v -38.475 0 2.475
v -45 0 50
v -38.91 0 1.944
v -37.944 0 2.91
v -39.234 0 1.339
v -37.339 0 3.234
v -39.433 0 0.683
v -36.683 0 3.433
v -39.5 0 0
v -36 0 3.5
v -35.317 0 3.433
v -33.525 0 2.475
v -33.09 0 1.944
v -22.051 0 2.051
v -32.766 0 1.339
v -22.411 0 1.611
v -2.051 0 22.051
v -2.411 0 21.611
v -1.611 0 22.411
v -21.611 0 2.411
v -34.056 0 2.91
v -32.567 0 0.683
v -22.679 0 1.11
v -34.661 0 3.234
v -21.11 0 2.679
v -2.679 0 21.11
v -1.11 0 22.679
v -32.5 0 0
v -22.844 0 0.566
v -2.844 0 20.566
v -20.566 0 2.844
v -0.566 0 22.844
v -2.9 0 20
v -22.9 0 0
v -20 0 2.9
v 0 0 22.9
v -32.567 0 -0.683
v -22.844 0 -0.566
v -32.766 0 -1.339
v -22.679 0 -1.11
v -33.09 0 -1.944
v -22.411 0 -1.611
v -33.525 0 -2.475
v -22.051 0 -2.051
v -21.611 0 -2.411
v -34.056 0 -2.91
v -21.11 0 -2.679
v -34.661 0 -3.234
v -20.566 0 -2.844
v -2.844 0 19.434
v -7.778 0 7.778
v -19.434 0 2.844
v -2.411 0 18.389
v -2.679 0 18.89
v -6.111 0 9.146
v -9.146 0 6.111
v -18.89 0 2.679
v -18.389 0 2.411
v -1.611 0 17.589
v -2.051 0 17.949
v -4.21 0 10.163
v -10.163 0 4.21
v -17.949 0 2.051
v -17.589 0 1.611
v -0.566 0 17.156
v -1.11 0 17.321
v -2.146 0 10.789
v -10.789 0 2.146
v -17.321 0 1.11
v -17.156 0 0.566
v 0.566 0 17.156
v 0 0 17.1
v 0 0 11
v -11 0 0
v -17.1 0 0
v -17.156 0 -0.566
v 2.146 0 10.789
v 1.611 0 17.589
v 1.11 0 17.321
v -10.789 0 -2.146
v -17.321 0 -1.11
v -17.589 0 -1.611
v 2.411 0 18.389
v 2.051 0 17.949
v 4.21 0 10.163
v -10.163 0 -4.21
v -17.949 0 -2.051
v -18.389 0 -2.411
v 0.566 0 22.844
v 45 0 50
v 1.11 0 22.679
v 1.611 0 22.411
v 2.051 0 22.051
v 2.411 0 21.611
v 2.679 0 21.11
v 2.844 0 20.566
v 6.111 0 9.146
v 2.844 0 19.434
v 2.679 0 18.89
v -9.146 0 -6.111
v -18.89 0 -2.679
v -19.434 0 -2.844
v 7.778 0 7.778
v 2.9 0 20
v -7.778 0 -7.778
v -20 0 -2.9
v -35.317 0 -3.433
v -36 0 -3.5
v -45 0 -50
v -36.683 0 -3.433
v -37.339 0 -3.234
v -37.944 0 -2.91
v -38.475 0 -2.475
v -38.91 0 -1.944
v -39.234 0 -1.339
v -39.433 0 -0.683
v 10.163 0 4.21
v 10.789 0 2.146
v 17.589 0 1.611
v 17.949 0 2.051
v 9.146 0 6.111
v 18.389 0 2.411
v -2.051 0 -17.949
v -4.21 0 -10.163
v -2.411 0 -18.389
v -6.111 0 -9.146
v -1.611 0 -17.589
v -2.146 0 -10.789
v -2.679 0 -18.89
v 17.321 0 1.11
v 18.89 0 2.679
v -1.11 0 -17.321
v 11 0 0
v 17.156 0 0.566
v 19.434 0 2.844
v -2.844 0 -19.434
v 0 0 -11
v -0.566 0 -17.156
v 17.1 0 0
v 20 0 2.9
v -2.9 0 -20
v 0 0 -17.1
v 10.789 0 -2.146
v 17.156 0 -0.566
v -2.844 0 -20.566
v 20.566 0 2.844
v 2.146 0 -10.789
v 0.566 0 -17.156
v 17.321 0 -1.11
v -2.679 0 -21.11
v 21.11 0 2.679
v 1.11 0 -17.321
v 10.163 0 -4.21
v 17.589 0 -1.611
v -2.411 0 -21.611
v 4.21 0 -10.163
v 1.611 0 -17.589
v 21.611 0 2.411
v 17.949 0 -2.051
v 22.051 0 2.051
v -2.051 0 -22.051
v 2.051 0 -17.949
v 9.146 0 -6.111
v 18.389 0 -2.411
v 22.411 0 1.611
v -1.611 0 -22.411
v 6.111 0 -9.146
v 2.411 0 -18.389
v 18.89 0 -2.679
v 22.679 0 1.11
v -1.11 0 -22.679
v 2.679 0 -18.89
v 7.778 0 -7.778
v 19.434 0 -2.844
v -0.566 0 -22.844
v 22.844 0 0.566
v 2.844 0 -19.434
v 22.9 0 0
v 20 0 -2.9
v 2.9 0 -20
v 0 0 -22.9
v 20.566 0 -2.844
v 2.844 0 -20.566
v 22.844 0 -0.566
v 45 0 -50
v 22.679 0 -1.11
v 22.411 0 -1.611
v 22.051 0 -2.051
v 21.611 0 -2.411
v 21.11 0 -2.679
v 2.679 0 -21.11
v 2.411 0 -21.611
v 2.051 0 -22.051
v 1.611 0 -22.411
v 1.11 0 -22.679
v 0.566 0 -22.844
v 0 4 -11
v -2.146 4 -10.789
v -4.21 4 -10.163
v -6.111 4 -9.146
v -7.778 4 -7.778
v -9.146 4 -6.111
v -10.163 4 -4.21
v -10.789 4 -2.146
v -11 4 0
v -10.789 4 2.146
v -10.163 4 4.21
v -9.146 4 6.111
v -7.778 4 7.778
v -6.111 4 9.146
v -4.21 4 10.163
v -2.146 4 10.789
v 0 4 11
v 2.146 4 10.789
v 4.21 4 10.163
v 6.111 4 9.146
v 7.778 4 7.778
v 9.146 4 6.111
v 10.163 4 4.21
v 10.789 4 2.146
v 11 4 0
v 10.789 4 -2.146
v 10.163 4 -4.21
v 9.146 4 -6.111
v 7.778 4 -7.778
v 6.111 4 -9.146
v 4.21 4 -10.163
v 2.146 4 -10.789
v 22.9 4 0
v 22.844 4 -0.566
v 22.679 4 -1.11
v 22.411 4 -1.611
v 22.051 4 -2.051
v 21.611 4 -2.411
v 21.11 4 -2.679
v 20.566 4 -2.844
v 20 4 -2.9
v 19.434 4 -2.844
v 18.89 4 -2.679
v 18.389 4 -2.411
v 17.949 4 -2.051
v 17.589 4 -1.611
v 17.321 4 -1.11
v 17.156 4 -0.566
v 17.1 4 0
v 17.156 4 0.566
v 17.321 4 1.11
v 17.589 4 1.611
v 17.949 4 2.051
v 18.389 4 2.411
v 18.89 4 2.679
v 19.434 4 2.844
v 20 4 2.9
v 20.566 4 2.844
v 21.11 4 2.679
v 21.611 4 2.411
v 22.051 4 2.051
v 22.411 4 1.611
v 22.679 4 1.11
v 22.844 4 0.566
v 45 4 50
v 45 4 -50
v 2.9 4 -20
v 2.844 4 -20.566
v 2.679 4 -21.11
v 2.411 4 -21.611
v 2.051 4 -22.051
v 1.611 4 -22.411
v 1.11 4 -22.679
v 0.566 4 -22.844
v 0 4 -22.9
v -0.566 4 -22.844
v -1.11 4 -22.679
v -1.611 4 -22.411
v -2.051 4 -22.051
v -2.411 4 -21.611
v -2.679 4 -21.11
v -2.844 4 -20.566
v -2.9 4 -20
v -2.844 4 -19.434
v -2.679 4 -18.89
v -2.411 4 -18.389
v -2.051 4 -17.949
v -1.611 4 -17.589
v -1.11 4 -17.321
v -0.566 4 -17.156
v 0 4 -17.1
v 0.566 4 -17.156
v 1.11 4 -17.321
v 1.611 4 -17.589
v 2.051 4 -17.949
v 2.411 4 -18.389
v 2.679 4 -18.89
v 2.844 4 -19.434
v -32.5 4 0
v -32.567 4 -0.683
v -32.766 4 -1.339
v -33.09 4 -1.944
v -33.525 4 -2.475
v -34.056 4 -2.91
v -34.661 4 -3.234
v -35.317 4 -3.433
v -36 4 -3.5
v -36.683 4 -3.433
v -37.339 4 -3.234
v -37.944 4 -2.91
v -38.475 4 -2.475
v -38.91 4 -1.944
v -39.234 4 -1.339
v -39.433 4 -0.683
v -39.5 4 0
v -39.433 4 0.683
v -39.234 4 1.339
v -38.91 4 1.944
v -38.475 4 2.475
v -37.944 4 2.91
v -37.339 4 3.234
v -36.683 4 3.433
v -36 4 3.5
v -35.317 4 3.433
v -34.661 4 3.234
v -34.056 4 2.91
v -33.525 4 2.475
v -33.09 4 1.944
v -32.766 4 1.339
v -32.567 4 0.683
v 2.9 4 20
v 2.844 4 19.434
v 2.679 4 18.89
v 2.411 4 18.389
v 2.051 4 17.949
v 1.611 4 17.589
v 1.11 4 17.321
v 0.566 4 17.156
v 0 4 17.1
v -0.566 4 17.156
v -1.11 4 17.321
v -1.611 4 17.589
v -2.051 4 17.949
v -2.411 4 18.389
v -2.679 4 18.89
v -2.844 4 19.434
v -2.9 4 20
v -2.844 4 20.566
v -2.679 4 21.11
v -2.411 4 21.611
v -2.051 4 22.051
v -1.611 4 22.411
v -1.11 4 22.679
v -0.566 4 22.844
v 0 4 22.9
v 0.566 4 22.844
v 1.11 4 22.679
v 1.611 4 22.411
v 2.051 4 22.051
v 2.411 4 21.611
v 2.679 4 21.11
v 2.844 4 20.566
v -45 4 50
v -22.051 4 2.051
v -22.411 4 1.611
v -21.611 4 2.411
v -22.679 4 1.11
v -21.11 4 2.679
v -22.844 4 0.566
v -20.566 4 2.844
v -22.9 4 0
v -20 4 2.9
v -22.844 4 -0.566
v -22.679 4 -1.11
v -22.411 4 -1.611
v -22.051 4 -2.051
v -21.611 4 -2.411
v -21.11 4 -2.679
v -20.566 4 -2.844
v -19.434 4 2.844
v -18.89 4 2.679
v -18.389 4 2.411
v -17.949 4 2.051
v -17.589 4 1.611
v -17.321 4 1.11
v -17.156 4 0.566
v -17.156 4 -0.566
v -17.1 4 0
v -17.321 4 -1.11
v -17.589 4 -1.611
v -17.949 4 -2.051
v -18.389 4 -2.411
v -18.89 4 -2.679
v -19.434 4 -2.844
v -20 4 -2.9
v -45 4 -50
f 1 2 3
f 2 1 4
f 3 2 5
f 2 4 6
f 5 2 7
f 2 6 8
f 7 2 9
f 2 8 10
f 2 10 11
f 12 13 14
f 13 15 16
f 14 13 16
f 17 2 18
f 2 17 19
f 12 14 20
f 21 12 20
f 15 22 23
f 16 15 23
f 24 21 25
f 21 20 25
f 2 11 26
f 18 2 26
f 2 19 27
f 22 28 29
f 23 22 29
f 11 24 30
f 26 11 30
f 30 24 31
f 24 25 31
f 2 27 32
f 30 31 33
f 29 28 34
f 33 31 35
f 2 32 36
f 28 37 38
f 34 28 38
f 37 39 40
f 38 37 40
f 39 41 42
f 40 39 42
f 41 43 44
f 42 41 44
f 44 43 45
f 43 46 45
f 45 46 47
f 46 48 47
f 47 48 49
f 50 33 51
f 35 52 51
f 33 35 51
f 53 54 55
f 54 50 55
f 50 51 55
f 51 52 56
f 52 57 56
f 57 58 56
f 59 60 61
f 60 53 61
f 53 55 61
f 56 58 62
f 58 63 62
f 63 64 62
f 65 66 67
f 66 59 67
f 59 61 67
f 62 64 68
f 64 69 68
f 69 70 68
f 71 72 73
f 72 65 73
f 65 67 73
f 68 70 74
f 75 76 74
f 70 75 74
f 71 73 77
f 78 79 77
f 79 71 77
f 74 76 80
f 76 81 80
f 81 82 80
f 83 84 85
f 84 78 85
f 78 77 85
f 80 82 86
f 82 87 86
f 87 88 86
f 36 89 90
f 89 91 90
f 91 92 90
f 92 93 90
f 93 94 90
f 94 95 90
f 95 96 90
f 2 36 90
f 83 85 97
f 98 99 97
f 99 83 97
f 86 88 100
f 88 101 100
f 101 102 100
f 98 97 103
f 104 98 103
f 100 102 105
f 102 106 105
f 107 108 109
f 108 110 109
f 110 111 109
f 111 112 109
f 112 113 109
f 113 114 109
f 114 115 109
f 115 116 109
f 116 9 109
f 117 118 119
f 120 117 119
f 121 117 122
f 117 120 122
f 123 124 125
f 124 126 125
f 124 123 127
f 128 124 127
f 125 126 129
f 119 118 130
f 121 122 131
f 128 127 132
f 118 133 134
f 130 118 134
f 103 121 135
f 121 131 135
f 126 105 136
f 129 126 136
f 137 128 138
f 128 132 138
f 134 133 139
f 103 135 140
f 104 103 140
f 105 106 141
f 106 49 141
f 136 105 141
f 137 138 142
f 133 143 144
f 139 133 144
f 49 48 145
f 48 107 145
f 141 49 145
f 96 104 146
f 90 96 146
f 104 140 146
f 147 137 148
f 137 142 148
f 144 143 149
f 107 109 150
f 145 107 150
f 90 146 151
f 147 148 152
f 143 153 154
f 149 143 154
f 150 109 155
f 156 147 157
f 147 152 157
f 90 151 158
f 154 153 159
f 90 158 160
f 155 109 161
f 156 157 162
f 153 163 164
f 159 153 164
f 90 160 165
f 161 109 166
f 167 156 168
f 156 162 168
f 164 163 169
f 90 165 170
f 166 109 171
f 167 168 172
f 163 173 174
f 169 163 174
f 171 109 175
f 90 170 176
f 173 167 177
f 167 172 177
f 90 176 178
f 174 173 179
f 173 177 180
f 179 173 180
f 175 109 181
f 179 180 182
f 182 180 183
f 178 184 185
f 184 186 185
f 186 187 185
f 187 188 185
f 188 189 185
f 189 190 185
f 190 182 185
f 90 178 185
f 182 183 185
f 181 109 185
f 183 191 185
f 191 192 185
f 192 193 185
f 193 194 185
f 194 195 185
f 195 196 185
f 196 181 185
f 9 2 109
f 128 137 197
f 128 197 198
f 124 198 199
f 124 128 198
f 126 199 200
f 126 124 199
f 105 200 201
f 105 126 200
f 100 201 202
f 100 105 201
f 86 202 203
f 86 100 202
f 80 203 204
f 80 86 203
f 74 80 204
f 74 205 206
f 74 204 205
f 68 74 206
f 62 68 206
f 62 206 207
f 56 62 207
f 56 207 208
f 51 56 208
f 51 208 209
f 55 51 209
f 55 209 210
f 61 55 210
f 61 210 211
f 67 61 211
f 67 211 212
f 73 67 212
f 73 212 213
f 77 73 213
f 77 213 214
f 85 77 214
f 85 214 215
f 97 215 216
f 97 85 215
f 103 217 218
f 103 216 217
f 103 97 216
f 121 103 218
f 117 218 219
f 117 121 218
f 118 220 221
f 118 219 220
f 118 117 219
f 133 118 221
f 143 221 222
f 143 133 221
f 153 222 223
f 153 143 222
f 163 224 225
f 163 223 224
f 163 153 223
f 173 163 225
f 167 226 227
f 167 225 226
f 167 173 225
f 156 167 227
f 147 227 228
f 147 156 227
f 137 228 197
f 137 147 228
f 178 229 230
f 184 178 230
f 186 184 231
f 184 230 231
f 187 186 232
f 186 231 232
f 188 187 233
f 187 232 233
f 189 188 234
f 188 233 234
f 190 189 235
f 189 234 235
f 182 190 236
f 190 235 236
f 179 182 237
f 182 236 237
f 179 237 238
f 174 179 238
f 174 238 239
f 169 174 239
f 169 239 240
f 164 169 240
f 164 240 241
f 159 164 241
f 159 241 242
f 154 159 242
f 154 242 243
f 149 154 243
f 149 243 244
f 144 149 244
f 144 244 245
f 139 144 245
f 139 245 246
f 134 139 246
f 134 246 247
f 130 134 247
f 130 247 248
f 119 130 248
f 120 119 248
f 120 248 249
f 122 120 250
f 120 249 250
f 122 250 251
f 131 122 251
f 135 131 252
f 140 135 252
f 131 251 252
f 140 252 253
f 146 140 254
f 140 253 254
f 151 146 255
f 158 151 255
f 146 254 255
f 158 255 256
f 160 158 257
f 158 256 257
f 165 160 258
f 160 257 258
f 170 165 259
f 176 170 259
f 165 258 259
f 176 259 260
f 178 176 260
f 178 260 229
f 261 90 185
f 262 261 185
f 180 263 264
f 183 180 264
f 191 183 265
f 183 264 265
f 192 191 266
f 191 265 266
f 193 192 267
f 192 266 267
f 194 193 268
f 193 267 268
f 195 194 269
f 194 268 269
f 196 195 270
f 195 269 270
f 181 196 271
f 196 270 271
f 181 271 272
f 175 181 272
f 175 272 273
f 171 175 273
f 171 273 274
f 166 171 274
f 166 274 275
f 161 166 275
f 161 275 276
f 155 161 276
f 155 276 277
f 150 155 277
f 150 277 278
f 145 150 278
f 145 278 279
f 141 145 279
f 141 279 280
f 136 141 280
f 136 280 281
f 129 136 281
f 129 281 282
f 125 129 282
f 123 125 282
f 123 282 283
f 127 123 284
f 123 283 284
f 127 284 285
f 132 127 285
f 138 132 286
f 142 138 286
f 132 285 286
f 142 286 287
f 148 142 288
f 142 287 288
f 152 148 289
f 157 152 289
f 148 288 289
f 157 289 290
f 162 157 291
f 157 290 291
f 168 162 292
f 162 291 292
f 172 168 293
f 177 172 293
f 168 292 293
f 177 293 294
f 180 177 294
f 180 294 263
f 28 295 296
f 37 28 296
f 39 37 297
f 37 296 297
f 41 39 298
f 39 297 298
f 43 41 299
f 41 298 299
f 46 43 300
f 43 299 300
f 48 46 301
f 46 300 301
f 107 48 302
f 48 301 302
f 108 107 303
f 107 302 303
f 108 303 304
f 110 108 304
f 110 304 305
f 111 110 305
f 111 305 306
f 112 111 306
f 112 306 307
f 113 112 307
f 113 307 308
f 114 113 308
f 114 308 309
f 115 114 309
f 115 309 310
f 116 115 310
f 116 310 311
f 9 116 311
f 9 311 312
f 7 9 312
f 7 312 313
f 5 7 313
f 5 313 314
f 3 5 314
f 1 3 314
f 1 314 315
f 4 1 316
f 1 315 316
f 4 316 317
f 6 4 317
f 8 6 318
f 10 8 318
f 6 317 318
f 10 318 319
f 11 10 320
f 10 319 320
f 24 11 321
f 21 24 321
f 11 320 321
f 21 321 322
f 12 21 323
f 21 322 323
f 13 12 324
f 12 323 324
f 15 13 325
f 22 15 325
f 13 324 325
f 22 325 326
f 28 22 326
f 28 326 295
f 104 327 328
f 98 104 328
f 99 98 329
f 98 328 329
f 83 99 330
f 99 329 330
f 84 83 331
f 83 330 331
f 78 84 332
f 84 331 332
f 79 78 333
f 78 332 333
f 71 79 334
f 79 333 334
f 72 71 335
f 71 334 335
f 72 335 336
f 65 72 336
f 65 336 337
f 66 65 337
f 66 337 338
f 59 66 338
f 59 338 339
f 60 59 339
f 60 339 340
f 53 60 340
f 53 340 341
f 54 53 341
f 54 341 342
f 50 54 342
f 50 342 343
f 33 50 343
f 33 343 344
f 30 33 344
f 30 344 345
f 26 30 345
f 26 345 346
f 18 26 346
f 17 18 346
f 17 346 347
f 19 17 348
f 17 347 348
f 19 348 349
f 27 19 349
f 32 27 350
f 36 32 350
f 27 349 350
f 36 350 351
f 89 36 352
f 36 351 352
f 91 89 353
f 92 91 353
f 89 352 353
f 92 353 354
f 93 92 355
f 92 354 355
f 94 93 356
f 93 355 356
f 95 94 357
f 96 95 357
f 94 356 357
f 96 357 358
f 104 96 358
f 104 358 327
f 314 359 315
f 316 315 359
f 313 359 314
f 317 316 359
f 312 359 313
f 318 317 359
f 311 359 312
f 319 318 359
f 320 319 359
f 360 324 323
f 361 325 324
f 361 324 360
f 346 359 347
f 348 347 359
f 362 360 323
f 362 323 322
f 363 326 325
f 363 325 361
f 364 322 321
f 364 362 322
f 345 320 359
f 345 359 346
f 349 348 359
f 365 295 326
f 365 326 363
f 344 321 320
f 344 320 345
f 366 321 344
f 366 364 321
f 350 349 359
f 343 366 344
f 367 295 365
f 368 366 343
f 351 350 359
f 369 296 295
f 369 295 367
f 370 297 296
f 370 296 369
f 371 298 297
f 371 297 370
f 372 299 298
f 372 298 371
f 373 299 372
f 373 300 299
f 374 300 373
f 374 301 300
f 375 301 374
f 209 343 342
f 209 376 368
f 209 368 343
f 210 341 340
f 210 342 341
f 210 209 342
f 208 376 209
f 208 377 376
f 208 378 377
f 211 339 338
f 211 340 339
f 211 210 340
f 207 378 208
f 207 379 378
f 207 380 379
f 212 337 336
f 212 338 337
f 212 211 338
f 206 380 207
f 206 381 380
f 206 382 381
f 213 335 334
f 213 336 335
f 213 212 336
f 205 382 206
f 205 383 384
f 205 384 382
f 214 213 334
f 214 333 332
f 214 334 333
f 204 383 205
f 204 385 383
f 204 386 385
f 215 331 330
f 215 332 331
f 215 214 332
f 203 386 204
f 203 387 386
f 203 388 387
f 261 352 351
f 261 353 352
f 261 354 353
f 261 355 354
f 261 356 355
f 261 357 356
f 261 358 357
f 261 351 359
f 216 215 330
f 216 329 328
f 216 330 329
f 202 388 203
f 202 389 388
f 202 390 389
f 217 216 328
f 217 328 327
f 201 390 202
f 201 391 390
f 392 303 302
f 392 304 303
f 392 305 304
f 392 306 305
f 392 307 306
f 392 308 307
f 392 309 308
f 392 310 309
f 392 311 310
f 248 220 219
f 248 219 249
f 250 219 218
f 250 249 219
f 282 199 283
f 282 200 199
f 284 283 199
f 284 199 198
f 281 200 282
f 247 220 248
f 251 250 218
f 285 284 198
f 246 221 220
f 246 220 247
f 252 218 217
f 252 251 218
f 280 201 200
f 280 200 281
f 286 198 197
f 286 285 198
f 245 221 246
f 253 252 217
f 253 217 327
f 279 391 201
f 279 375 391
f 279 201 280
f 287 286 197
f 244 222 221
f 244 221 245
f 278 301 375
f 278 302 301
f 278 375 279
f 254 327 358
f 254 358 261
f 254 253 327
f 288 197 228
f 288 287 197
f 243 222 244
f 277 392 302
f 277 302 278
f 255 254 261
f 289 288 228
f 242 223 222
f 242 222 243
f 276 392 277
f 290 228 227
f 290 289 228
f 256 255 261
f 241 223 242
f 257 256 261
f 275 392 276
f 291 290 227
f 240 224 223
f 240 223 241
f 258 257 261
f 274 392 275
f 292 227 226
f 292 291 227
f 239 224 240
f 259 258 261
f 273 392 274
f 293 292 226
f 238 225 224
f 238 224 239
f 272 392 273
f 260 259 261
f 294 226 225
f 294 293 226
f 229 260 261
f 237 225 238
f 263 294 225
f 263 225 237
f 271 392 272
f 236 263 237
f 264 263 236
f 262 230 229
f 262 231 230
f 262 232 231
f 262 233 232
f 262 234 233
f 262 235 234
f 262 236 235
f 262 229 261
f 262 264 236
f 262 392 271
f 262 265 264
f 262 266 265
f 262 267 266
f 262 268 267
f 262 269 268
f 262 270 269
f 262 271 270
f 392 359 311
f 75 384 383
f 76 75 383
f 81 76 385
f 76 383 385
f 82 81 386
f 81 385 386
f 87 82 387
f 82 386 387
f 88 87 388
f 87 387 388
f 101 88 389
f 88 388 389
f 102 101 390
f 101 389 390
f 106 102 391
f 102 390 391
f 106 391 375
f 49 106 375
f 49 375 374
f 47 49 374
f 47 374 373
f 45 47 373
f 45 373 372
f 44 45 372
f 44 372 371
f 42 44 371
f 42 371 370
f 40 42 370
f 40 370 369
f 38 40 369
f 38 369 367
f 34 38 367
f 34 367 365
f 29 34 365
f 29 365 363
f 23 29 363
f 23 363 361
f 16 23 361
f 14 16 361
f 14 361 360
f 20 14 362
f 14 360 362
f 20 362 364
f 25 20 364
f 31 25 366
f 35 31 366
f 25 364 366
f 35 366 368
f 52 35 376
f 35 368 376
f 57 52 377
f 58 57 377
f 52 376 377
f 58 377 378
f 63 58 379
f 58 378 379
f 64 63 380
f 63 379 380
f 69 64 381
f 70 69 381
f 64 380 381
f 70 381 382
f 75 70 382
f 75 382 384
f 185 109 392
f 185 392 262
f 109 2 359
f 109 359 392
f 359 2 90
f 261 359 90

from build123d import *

# Parameters (mm, degrees)
ESQUISSE1_W                  = 90
ESQUISSE1_H                  = 100
BOSS_EXTRU_1_DEPTH           = 4
ENL_V_MAT_EXTRU_1_DEPTH      = 1401.799142477
ENL_V_MAT_EXTRU_1_DEPTH_BACK = 1401.799142477
ESQUISSE2_R                  = 11
D_GAGEMENT_M51_D             = 5.8
D_GAGEMENT_M51_DEPTH         = 20
D_GAGEMENT_M51_TIP           = 1.742495795
D_GAGEMENT_M61_D             = 7
D_GAGEMENT_M61_DEPTH         = 20
D_GAGEMENT_M61_TIP           = 2.103012167


with BuildPart() as part:
    # Esquisse1 → Boss.-Extru.1 (new body)
    with BuildSketch(Plane(origin=(0, 0, 0), x_dir=(1, 0, 0), z_dir=(0, 1, 0))):
        Rectangle(ESQUISSE1_W, ESQUISSE1_H)
    extrude(amount=BOSS_EXTRU_1_DEPTH)

    # Esquisse2 → Enlèv. mat.-Extru.1 (cut, two sides: drawn at the far end of the back side and taken through both)
    with BuildSketch(Plane(origin=(-1346.410161514, -150, 0), x_dir=(0, 0, -1), z_dir=(0, 1, 0)).offset(-ENL_V_MAT_EXTRU_1_DEPTH_BACK)):
        with Locations((0, -1346.410161514)):
            Circle(ESQUISSE2_R)
    extrude(amount=ENL_V_MAT_EXTRU_1_DEPTH + ENL_V_MAT_EXTRU_1_DEPTH_BACK, mode=Mode.SUBTRACT)

    # Dégagement M51
    with Locations(Plane(origin=(0, -8, 0), x_dir=(-1, 0, 0), z_dir=(0, -1, 0))):
        with Locations((20, 0), (0, -20), (-20, 0), (0, 20)):
            Hole(D_GAGEMENT_M51_D / 2, depth=D_GAGEMENT_M51_DEPTH)
            with Locations((0, 0, -(D_GAGEMENT_M51_DEPTH + D_GAGEMENT_M51_TIP / 2))):  # 118° drill point
                Cone(0, D_GAGEMENT_M51_D / 2, D_GAGEMENT_M51_TIP, mode=Mode.SUBTRACT)

    # Dégagement M61
    with Locations(Plane(origin=(0, 0, 0), x_dir=(-1, 0, 0), z_dir=(0, -1, 0))):
        with Locations((36, 0)):
            Hole(D_GAGEMENT_M61_D / 2, depth=D_GAGEMENT_M61_DEPTH)
            with Locations((0, 0, -(D_GAGEMENT_M61_DEPTH + D_GAGEMENT_M61_TIP / 2))):  # 118° drill point
                Cone(0, D_GAGEMENT_M61_D / 2, D_GAGEMENT_M61_TIP, mode=Mode.SUBTRACT)


solid = part.part
